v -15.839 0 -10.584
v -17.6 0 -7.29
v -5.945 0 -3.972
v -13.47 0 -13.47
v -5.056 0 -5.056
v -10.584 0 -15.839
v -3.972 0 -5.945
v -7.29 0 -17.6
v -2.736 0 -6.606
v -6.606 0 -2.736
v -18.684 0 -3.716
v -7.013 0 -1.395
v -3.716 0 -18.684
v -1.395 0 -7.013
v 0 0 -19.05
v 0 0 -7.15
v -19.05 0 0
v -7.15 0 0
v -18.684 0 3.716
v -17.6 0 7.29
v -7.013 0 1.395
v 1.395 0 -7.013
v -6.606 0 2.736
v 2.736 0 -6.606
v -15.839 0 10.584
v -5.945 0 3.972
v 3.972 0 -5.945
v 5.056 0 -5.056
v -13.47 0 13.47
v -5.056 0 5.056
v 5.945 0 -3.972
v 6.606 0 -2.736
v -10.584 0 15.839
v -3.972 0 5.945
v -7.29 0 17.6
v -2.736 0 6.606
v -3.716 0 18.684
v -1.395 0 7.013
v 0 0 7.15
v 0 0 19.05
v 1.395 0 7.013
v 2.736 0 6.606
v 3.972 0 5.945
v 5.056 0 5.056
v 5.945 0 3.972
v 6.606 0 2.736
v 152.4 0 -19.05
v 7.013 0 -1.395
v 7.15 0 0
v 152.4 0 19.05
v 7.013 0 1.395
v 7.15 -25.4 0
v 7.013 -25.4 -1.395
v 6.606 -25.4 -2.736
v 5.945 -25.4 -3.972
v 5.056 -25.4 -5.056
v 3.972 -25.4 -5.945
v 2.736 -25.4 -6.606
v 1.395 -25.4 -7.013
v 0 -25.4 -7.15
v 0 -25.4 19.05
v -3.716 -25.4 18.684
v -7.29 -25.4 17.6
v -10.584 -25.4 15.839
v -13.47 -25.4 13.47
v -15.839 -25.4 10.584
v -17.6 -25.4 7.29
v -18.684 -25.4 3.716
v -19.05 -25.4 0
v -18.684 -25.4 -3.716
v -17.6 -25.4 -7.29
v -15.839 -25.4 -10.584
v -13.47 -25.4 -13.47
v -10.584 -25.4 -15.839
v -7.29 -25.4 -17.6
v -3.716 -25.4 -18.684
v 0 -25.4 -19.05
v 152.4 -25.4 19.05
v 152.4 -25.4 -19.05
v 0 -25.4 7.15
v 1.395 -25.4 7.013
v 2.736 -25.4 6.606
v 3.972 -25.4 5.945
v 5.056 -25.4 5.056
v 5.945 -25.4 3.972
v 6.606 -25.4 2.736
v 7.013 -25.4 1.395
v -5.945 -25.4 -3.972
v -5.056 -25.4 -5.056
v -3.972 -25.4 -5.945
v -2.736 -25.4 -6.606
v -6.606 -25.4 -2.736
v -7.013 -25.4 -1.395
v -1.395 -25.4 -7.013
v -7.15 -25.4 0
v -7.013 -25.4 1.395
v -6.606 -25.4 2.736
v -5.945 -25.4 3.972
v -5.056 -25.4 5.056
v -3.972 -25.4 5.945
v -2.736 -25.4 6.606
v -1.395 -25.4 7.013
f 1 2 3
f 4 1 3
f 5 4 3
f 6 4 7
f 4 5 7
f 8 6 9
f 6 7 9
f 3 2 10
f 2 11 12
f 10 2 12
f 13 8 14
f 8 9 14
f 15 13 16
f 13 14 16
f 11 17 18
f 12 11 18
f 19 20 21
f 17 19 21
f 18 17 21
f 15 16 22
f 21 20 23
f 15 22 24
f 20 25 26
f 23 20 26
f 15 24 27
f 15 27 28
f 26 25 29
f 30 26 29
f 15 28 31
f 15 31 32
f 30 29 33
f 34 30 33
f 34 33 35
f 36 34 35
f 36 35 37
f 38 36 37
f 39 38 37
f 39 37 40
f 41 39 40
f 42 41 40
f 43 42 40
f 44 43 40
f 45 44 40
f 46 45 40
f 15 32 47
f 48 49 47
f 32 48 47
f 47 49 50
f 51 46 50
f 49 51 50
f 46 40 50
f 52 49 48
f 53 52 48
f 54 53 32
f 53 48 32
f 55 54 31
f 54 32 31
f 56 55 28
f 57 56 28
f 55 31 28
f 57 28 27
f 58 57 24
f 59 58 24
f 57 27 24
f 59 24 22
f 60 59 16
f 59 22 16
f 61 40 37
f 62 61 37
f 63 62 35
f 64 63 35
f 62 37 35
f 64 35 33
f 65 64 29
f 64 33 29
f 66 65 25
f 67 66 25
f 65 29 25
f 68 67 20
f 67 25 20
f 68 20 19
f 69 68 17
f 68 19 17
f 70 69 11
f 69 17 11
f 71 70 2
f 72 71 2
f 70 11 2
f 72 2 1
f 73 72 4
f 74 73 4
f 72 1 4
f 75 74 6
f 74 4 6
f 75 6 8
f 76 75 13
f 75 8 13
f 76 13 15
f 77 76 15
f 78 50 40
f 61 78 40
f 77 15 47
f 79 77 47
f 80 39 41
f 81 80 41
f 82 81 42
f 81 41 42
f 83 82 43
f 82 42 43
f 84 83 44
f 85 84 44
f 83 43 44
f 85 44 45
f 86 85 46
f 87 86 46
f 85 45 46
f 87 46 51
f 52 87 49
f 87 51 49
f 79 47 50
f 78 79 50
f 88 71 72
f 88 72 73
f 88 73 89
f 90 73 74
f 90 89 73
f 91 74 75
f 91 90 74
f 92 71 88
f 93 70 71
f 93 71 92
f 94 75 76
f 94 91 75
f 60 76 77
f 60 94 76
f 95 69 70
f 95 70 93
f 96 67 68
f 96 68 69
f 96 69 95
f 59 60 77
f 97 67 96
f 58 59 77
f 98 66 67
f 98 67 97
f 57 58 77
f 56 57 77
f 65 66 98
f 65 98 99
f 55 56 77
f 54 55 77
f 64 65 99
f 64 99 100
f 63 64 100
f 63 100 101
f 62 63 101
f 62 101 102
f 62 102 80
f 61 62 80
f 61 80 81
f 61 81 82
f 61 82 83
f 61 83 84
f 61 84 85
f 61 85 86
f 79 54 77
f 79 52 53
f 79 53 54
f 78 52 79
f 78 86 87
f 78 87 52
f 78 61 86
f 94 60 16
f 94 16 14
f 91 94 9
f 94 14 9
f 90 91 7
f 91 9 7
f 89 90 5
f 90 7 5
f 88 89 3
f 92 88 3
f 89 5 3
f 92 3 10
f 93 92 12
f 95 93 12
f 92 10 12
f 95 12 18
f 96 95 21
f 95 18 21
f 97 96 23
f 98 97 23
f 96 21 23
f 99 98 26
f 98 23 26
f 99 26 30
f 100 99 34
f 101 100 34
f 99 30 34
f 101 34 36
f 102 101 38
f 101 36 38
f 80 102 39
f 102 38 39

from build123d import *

# Parameters (mm, degrees)
F1_DEPTH = 25.4


with BuildPart() as f1:
    # F0 (on Front) → F1 (new body)
    with BuildSketch(Plane.XZ):
        with BuildLine():
            Line((0, 7.1501), (0, 19.05))
            ThreePointArc((0, 19.05), (-19.05, 0), (0, -19.05))
            Line((0, -19.05), (0, -7.1501))
            ThreePointArc((0, -7.1501), (-7.1501, 0), (0, 7.1501))
        make_face()
        with BuildLine():
            ThreePointArc((0, -19.05), (13.470384, -13.470384), (19.05, 0))
            ThreePointArc((19.05, 0), (13.470384, 13.470384), (0, 19.05))
            Line((0, 19.05), (0, 7.1501))
            ThreePointArc((0, 7.1501), (5.055884, 5.055884), (7.1501, 0))
            ThreePointArc((7.1501, 0), (5.055884, -5.055884), (0, -7.1501))
            Line((0, -7.1501), (0, -19.05))
        make_face()
        with BuildLine():
            ThreePointArc((0, 19.05), (13.470384, 13.470384), (19.05, 0))
            ThreePointArc((19.05, 0), (13.470384, -13.470384), (0, -19.05))
            Line((0, -19.05), (152.4, -19.05))
            Line((152.4, -19.05), (152.4, 19.05))
            Line((152.4, 19.05), (0, 19.05))
        make_face()
    extrude(amount=F1_DEPTH)


solid = f1.part
